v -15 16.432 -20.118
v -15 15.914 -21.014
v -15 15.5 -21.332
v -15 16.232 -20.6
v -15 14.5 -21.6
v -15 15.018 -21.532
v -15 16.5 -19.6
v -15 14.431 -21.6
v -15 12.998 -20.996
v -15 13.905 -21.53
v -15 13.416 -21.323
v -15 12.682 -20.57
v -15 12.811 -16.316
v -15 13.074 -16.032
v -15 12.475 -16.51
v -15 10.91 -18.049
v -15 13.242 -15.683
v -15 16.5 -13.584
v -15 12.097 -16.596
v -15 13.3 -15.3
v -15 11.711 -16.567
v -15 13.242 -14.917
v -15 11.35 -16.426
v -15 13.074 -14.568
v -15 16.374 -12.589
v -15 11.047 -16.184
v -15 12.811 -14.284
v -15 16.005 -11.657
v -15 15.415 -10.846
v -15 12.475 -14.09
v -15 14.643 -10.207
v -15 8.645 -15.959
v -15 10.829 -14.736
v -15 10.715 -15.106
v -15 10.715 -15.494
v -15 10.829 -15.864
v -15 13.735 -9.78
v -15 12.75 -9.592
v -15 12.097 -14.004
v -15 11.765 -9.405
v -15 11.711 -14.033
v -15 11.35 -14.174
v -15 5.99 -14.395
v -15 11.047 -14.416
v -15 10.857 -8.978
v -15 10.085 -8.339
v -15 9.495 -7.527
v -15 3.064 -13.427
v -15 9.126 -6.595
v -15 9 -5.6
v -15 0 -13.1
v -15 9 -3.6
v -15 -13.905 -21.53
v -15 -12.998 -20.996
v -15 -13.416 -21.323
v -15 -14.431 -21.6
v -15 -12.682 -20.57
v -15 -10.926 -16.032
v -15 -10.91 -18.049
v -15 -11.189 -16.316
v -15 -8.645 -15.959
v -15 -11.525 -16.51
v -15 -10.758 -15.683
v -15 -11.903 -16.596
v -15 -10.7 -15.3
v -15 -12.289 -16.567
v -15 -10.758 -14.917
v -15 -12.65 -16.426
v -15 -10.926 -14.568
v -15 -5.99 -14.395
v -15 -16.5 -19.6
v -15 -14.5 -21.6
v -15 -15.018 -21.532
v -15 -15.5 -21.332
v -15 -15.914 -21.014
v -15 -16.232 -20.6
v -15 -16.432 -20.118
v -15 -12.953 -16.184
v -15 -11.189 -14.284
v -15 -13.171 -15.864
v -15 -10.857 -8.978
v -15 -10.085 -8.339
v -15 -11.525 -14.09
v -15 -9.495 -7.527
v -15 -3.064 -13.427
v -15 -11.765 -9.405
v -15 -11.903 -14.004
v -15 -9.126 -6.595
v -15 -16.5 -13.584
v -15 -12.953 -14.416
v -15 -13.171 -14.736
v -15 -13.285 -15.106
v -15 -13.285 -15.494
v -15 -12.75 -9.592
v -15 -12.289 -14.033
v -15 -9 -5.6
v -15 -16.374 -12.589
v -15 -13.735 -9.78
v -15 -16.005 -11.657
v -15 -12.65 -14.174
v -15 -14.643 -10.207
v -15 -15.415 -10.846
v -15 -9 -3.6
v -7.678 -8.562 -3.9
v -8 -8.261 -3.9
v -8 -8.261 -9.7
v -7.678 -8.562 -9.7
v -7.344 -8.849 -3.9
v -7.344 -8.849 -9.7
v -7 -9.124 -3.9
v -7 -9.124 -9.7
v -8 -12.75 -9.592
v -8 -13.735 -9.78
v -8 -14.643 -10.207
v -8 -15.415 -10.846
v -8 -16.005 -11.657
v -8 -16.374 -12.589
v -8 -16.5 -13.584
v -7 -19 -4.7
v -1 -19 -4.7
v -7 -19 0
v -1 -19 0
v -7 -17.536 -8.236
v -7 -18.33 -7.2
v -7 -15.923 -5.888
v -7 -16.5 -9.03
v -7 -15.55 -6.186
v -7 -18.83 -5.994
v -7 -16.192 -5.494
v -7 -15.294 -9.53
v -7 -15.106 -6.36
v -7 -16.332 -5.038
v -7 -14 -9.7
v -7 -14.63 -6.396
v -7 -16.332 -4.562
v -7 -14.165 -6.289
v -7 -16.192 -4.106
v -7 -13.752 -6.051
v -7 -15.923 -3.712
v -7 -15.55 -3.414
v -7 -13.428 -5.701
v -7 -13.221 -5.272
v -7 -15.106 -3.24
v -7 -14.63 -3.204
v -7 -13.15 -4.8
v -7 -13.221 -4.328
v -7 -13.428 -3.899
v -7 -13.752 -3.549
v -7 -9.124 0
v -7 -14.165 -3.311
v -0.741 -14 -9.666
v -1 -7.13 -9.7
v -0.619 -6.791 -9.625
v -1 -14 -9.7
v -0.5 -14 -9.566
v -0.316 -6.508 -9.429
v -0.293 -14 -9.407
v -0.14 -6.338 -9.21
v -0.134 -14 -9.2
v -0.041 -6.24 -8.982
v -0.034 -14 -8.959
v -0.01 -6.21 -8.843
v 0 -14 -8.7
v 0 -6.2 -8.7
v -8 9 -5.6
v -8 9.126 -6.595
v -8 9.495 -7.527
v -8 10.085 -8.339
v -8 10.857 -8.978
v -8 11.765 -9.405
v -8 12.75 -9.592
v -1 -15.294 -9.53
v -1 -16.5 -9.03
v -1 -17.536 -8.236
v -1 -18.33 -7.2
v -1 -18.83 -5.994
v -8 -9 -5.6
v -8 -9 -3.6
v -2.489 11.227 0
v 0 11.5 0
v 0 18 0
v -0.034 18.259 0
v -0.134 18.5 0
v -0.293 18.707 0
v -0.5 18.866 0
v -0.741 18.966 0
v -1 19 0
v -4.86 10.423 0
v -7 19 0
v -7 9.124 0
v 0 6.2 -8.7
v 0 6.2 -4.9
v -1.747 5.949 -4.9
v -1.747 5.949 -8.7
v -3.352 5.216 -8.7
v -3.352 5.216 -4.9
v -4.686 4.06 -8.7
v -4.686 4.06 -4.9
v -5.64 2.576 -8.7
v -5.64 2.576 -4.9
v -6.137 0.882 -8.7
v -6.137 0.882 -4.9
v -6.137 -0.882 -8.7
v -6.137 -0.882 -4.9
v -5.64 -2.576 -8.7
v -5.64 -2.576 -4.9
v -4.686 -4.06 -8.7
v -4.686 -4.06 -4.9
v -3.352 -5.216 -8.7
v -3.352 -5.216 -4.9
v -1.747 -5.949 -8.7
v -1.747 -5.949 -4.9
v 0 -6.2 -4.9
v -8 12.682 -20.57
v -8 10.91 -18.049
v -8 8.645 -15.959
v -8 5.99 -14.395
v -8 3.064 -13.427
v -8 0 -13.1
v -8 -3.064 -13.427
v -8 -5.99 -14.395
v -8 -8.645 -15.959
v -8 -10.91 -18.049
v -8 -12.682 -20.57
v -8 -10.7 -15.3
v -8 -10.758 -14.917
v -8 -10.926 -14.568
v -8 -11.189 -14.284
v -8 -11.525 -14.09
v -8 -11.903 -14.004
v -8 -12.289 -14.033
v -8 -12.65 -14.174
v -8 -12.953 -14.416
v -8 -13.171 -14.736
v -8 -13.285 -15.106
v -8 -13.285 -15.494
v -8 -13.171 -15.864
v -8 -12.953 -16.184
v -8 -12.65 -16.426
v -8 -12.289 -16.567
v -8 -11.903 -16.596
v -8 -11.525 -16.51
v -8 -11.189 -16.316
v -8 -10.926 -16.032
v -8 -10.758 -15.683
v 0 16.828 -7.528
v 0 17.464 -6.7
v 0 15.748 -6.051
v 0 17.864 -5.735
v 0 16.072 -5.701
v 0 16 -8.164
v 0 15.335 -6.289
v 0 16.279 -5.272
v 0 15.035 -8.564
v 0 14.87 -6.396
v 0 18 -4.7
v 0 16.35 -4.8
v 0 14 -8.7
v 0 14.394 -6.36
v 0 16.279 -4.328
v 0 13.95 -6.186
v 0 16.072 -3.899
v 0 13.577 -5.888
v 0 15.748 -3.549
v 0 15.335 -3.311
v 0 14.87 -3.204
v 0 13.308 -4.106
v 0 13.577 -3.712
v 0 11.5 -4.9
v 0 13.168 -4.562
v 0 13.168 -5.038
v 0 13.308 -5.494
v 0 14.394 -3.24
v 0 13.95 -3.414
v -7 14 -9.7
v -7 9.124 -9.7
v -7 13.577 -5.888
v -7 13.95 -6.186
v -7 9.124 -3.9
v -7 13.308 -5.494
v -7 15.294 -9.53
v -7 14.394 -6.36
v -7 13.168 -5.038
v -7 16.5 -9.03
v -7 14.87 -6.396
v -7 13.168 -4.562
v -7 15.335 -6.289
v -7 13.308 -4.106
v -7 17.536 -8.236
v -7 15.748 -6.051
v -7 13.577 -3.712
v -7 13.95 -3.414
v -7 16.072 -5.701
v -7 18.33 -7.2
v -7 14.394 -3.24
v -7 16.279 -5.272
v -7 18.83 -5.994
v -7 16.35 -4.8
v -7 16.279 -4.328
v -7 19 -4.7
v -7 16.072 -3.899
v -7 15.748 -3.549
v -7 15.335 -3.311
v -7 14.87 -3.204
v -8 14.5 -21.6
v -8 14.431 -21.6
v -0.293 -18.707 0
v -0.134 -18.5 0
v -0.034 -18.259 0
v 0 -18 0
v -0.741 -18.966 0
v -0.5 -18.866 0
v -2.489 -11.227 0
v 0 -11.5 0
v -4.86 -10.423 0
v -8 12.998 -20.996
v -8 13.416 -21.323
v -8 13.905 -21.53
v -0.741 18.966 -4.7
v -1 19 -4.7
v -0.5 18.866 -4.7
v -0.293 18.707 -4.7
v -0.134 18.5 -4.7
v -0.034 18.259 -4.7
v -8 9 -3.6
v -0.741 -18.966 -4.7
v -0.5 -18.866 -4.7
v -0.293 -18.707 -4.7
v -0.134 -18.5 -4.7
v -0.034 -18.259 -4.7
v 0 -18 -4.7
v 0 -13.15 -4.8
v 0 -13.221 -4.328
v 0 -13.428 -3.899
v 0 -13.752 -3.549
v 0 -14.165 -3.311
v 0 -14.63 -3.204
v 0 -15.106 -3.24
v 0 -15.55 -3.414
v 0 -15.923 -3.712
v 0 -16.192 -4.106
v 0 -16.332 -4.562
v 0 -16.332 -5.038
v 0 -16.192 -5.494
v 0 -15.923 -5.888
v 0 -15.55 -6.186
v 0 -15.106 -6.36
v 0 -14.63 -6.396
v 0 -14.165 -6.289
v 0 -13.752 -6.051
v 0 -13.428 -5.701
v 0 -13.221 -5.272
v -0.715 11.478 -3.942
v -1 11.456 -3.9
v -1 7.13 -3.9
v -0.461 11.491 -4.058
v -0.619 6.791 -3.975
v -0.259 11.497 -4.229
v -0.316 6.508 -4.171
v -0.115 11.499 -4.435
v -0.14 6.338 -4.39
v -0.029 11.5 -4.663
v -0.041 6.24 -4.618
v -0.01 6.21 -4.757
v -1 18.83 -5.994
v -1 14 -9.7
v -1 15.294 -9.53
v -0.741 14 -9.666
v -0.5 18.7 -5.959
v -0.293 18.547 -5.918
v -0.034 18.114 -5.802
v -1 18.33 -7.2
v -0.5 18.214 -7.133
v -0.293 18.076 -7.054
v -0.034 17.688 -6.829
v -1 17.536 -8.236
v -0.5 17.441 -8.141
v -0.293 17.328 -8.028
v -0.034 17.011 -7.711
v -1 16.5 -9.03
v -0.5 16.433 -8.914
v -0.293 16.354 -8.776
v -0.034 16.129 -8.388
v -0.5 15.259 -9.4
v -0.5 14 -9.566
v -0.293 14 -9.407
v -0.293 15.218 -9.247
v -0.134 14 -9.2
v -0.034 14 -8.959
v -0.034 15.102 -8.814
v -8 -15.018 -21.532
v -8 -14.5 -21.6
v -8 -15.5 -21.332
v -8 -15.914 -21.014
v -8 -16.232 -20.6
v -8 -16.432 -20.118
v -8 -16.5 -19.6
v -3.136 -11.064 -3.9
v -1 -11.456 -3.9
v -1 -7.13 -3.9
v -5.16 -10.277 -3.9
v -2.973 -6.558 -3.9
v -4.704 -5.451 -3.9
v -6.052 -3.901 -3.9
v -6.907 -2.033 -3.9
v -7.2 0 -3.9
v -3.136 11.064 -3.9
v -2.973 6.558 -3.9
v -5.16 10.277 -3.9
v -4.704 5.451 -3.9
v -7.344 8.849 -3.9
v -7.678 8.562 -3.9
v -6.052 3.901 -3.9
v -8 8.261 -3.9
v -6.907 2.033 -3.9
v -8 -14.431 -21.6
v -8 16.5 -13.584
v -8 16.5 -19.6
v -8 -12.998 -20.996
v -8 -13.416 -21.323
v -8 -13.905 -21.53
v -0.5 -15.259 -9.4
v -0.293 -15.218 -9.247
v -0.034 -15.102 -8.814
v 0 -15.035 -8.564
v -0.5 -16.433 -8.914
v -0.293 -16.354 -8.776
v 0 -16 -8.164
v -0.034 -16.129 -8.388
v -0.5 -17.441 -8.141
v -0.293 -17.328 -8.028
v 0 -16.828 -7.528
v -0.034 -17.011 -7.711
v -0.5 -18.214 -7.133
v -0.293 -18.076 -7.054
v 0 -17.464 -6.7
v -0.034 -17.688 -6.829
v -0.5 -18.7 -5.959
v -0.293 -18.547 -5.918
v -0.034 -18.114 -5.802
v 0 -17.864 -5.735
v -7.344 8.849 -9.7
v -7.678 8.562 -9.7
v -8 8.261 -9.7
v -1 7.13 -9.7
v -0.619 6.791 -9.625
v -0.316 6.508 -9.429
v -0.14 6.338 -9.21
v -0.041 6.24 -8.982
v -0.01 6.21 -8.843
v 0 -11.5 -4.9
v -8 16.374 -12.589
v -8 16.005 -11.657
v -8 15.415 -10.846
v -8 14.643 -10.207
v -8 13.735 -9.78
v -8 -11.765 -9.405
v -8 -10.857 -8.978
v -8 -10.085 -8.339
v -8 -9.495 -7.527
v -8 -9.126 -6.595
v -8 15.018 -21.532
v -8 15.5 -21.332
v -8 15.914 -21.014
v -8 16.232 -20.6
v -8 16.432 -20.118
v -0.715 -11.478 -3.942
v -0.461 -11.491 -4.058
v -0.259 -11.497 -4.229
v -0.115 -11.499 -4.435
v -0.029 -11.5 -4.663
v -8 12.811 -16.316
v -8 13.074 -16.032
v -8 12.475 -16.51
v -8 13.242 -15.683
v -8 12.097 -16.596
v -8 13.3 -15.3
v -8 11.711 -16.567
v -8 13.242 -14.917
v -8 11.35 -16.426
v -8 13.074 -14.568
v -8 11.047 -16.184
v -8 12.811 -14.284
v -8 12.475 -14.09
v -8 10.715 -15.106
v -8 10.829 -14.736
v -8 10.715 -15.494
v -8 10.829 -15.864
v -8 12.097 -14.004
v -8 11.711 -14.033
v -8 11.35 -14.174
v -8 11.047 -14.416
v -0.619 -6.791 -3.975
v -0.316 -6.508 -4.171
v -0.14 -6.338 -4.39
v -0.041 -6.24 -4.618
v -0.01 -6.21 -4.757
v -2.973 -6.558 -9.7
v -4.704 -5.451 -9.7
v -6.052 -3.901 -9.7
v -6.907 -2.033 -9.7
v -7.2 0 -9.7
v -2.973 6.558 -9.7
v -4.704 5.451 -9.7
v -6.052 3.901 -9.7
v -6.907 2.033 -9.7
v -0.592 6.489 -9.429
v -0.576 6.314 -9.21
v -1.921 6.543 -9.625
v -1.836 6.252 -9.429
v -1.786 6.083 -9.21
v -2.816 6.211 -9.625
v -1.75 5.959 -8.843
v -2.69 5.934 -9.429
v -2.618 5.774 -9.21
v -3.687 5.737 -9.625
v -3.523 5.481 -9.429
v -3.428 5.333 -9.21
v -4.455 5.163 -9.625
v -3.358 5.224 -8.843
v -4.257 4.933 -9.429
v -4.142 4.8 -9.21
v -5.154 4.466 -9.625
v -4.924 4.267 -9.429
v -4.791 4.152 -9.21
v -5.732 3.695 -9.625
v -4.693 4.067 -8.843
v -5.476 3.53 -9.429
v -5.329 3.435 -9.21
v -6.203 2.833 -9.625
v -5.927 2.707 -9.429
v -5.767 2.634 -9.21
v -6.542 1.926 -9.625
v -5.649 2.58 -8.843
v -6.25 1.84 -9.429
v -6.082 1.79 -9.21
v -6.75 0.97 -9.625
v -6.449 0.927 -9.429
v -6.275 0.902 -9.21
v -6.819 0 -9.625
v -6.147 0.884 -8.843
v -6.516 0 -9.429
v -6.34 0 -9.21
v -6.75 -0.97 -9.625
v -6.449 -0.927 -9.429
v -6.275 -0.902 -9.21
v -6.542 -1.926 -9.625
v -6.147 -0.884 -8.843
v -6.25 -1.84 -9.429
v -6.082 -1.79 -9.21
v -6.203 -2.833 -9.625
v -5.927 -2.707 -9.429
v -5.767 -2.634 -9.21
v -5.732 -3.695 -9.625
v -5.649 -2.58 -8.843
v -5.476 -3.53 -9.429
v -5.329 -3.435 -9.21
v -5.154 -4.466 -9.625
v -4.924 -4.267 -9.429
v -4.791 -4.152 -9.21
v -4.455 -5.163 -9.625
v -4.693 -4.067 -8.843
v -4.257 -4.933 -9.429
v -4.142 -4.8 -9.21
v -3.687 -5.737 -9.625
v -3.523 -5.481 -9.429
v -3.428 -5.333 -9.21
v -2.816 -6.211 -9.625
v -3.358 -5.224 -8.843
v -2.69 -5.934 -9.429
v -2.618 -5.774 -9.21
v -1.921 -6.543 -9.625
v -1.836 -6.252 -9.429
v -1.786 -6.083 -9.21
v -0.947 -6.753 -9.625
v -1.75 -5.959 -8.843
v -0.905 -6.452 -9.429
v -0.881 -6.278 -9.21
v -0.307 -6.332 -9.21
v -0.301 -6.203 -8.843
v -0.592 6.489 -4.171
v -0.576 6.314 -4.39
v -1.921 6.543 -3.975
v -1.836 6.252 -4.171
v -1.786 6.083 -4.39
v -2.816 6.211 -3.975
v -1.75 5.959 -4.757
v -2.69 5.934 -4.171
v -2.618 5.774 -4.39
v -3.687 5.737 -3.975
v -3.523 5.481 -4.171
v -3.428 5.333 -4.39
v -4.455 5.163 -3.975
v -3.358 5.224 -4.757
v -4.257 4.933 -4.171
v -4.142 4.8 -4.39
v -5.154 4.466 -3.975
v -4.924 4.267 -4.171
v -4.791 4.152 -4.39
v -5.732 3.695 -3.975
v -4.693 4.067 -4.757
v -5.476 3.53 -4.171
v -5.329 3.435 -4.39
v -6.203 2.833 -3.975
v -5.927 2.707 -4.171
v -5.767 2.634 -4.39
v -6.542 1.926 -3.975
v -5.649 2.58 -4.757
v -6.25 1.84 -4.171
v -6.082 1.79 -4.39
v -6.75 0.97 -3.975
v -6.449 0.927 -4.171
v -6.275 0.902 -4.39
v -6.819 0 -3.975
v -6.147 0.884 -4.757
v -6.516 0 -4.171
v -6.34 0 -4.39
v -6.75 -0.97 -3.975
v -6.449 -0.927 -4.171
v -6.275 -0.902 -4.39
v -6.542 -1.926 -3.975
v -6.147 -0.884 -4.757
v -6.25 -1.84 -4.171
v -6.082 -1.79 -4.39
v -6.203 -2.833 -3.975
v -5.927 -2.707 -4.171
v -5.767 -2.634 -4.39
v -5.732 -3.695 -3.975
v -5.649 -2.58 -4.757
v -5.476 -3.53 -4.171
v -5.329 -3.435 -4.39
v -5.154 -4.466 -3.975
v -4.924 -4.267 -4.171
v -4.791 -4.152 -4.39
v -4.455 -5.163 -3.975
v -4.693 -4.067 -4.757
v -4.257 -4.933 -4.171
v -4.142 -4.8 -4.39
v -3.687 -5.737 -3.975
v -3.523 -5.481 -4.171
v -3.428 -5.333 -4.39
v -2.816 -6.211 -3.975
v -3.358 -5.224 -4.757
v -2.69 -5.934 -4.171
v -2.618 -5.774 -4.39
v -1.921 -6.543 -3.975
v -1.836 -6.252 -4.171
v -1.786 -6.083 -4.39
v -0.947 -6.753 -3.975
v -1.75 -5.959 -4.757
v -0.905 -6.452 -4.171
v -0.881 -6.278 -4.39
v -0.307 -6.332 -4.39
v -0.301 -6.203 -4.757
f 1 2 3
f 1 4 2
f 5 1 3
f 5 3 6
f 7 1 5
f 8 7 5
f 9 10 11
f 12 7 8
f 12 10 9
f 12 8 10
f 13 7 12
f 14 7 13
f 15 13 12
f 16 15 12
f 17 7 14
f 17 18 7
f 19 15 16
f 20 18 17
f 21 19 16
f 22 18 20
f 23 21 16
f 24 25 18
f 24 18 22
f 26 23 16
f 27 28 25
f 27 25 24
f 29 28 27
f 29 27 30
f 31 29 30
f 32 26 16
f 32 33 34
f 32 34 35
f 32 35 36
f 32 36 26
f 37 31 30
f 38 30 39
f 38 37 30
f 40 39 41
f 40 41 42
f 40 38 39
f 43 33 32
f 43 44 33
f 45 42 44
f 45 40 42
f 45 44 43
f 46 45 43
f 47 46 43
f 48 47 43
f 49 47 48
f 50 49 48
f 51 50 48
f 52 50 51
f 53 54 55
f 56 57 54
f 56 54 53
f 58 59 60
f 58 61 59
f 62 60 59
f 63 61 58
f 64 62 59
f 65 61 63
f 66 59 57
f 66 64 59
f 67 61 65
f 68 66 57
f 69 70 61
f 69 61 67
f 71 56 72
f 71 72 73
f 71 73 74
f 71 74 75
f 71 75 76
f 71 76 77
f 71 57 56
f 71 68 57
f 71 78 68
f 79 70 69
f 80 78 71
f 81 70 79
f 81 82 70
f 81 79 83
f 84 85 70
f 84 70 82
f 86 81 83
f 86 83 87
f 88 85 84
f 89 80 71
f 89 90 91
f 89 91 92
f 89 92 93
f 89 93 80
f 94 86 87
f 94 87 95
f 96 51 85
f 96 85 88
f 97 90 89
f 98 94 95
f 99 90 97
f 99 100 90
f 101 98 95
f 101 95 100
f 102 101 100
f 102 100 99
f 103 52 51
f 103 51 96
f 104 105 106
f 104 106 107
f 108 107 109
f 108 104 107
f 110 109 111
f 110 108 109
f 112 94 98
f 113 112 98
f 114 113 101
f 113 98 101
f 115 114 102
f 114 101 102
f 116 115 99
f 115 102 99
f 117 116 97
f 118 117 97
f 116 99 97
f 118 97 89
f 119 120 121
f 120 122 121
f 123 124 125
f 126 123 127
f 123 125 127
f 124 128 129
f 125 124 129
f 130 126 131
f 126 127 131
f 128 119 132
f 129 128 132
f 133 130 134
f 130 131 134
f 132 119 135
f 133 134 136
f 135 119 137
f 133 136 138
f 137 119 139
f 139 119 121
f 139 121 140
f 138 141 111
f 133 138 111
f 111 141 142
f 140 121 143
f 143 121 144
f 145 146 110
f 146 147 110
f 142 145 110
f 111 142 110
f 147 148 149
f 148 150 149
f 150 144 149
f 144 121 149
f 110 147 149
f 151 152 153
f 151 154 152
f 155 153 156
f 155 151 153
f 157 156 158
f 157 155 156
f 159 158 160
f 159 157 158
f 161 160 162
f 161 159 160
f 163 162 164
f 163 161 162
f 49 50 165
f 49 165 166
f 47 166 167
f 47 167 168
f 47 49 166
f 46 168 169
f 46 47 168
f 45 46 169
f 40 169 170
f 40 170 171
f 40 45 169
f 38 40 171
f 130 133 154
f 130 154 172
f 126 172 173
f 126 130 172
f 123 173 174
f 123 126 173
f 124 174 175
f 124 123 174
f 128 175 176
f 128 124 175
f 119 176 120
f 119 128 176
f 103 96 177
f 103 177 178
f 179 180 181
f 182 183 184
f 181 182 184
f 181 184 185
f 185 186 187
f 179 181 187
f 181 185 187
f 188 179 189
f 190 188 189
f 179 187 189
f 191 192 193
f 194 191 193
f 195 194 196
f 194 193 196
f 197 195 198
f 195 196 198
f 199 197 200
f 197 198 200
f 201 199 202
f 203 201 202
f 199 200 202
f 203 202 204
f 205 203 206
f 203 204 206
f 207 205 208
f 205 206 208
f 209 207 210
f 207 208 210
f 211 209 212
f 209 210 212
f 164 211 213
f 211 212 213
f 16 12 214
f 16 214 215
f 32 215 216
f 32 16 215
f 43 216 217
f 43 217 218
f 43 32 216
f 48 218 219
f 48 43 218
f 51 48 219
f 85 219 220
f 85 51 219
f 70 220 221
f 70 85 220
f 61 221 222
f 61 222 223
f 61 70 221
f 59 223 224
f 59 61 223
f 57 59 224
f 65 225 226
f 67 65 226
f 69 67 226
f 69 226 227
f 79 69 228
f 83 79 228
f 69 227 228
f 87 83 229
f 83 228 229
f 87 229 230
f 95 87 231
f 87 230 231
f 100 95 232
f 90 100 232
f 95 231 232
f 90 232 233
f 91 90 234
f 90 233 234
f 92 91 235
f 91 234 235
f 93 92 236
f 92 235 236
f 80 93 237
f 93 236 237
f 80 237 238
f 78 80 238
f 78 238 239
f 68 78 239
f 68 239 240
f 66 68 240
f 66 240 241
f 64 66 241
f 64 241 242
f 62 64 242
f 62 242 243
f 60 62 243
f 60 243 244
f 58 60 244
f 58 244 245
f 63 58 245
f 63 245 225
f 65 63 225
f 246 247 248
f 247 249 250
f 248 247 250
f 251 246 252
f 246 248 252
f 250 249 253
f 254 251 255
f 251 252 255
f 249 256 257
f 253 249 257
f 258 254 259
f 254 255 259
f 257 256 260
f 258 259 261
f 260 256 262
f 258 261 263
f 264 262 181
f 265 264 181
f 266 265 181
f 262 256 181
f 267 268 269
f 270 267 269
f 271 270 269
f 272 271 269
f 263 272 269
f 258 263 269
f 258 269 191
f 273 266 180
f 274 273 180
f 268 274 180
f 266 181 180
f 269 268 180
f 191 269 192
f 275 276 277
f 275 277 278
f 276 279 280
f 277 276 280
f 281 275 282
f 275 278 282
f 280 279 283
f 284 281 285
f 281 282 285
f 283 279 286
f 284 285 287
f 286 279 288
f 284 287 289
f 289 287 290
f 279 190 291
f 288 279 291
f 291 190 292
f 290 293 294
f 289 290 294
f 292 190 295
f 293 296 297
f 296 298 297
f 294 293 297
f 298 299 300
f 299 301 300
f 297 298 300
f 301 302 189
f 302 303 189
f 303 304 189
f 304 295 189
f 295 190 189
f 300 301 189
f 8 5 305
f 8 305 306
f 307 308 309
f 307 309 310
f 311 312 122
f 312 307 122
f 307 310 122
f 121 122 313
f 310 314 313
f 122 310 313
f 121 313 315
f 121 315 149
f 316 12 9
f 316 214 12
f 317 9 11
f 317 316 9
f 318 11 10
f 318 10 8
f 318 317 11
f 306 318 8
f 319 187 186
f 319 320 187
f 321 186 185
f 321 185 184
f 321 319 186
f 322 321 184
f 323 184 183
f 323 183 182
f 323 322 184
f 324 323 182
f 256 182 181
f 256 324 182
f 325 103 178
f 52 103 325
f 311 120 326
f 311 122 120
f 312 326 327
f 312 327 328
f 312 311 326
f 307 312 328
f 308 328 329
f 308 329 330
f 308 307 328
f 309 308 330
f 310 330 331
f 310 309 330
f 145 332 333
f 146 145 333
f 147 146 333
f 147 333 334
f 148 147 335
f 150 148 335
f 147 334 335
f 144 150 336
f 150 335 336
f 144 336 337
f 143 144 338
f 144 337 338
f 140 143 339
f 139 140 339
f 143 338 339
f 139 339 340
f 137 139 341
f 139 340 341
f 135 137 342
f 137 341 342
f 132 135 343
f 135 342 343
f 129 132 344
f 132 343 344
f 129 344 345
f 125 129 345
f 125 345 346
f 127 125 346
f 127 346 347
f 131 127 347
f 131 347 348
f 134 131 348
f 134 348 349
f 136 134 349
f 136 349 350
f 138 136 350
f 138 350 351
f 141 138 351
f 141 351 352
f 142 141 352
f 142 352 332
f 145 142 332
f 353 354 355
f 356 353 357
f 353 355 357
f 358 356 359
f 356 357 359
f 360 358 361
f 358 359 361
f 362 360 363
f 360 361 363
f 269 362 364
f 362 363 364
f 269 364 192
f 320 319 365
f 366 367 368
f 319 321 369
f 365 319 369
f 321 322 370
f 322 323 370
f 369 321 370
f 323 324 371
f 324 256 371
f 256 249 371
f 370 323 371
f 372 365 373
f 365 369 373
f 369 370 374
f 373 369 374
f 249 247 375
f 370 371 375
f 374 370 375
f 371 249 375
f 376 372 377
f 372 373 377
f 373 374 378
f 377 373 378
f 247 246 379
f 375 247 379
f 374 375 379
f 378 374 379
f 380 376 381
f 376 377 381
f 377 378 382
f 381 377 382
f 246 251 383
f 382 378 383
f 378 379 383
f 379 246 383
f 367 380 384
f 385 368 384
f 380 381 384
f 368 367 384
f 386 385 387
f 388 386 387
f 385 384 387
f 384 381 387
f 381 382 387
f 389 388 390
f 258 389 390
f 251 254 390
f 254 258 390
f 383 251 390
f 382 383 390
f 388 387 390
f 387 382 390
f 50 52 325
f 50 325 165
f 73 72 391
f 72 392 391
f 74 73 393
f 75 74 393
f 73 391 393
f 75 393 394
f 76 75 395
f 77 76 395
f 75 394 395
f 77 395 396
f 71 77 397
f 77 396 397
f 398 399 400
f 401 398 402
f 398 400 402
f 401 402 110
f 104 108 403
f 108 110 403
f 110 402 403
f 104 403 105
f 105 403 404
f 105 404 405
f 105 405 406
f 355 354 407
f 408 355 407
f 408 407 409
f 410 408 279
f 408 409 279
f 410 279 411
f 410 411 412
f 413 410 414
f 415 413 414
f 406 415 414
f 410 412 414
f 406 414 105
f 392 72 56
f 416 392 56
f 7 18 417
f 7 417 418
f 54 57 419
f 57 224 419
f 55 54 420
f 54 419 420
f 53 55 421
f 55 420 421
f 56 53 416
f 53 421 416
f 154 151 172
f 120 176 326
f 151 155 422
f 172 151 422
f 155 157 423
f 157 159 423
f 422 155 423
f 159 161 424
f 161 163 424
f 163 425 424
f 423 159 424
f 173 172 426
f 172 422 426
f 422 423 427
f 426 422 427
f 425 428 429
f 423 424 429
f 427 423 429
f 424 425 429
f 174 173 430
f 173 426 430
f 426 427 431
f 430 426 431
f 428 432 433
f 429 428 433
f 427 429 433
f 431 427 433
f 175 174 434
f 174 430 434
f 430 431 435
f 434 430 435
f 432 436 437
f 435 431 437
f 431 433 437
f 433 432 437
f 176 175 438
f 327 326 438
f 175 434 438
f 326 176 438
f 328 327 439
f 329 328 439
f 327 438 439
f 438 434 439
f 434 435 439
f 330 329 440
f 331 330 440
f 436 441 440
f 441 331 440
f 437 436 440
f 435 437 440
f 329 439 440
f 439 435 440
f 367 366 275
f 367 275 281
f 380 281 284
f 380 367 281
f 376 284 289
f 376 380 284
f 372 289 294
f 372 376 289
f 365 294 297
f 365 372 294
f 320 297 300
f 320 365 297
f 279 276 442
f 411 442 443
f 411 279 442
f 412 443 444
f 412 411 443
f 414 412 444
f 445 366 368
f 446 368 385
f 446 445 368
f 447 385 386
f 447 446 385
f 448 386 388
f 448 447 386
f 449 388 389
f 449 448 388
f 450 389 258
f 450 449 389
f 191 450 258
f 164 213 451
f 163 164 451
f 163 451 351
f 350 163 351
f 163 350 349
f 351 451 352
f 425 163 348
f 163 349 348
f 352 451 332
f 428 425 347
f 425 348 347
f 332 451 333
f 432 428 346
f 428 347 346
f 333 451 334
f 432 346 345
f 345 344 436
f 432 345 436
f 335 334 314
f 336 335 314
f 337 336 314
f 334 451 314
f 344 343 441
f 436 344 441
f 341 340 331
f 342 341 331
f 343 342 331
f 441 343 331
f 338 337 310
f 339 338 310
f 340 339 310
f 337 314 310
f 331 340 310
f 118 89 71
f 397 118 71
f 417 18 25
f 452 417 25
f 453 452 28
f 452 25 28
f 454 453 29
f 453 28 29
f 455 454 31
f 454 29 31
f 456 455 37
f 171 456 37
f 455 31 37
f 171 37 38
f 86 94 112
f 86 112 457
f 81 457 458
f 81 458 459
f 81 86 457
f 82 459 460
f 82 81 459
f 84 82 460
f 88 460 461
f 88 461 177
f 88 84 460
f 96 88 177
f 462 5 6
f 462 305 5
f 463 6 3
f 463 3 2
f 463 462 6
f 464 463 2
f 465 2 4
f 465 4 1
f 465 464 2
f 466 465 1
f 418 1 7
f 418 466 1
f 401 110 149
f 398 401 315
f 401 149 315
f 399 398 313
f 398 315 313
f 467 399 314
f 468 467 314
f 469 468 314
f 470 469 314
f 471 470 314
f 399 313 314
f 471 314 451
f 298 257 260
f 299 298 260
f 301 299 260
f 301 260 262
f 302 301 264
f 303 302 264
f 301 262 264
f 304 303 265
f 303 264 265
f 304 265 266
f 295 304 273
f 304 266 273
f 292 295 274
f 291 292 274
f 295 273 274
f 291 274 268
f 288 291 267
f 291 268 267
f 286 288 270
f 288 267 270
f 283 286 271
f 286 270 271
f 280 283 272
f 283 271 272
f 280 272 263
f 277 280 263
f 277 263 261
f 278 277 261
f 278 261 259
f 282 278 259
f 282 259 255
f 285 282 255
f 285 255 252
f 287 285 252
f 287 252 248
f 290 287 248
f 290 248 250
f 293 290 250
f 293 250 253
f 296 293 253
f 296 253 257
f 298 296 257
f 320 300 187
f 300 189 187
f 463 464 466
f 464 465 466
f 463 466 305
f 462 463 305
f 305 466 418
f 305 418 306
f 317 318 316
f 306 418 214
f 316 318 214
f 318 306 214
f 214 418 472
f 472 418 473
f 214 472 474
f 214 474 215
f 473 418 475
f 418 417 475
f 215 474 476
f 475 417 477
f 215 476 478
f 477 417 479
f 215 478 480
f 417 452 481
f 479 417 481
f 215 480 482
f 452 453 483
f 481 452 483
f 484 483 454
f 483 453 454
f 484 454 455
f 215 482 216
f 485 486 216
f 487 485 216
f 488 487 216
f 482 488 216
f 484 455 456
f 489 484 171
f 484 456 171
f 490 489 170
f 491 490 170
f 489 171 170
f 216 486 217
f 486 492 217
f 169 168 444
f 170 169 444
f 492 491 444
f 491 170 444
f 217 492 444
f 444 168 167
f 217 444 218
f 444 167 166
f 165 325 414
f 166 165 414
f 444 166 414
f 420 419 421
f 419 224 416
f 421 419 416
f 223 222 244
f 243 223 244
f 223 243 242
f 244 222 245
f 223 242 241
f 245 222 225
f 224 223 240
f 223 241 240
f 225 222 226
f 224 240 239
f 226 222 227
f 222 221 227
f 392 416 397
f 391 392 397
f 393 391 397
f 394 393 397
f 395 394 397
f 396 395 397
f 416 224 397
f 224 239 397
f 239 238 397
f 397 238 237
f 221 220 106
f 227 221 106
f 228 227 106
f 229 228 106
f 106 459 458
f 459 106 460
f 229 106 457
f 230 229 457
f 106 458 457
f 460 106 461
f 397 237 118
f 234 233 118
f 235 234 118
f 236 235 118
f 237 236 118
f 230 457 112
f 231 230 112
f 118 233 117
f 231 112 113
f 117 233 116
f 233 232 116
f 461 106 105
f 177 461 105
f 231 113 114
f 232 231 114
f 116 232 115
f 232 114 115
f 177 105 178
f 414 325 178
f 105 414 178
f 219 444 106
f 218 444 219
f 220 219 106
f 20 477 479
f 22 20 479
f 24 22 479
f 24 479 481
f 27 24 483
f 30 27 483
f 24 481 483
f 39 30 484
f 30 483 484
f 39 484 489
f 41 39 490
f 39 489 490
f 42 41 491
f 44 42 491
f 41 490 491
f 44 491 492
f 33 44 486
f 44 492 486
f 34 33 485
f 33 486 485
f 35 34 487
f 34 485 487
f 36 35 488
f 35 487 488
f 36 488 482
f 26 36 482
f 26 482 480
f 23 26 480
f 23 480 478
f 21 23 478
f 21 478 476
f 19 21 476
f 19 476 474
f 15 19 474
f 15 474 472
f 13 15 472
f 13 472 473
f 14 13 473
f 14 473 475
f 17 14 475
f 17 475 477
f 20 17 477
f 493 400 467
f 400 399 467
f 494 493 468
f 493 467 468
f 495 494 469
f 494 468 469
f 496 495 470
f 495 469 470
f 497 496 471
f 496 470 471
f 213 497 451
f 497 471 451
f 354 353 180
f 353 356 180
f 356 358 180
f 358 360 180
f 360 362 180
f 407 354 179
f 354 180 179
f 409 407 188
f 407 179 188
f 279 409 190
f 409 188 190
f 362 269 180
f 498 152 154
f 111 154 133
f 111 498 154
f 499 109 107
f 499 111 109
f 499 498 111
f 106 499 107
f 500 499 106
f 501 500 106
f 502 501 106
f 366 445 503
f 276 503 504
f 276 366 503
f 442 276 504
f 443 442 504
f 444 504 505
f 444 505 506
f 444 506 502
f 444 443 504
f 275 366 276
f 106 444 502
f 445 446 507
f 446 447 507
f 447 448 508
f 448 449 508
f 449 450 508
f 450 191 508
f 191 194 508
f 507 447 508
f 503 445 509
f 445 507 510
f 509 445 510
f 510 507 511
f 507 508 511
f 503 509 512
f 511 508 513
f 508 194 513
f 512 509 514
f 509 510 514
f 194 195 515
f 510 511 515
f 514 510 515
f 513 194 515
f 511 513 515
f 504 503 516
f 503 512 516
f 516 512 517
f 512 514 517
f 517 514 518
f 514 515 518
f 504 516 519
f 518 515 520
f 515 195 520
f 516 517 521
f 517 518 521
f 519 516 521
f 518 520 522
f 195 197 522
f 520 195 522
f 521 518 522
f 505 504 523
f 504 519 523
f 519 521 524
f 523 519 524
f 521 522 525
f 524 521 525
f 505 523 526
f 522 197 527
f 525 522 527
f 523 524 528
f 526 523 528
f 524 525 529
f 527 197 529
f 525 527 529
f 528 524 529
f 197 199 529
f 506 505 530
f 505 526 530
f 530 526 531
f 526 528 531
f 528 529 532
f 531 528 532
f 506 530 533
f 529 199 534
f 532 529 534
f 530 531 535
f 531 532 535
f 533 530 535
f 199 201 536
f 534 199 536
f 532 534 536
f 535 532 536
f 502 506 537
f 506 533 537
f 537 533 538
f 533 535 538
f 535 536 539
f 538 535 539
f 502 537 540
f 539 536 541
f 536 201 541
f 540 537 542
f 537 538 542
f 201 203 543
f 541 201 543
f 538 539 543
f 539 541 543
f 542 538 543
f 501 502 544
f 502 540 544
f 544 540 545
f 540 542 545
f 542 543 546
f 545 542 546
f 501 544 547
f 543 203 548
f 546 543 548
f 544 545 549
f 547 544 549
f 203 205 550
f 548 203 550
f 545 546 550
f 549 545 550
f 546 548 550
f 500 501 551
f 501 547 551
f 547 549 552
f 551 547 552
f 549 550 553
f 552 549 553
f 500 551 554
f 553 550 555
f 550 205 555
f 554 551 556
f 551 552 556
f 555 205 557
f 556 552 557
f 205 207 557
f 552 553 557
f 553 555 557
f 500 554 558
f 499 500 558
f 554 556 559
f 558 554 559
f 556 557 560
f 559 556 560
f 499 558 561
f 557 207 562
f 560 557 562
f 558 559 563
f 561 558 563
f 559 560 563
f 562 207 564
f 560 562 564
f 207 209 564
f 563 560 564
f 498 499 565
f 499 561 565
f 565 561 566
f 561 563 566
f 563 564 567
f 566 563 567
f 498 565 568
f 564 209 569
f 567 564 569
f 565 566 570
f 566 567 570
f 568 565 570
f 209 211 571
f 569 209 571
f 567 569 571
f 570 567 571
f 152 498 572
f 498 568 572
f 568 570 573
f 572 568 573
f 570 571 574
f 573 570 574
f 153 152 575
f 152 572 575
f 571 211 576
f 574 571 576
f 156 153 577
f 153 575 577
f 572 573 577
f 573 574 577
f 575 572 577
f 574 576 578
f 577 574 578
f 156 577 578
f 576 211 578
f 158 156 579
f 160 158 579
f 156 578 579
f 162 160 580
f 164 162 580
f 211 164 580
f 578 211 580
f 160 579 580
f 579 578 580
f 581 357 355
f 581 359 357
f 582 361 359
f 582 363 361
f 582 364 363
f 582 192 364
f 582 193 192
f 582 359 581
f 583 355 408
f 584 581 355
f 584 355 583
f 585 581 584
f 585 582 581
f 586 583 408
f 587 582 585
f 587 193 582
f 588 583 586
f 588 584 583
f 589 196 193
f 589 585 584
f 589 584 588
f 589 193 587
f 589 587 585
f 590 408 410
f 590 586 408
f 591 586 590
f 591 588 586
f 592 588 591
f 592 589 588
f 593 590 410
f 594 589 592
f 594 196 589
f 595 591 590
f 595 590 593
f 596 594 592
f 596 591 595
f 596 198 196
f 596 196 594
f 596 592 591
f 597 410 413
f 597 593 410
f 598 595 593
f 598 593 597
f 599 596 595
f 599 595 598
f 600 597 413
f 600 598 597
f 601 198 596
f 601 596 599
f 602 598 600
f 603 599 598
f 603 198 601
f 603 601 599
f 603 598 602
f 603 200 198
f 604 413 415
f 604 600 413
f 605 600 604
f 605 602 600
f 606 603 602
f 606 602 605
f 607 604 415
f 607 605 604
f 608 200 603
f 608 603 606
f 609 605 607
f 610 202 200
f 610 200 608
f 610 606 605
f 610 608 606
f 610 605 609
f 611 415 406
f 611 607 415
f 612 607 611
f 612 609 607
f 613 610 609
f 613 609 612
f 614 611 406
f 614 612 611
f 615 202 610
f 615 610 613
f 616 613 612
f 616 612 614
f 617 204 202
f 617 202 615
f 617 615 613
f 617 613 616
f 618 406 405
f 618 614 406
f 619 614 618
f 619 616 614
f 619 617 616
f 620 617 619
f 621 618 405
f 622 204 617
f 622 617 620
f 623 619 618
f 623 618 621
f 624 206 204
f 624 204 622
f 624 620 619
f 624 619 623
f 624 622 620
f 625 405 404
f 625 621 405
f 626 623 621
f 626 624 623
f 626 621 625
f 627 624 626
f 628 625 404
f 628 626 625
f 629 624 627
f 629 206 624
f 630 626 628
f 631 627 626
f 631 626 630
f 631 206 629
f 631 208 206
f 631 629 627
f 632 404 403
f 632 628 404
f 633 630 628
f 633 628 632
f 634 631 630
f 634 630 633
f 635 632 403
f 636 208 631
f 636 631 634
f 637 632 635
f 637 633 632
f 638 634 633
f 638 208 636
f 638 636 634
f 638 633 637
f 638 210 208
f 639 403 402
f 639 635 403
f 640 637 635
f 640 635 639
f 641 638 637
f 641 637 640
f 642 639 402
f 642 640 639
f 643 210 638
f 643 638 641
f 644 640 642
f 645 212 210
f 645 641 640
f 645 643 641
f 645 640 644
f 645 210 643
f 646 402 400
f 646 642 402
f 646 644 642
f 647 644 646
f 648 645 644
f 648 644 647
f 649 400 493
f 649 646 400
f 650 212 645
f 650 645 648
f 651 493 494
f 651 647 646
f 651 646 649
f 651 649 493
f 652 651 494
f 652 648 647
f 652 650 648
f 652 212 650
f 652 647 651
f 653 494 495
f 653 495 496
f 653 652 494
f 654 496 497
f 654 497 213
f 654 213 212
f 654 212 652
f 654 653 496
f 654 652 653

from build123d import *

# Parameters (mm, degrees)
PAD008_DEPTH    = 9.7
POCKET002_DEPTH = 3.9
PAD009_DEPTH    = 7
SKETCH048_R     = 1.6
SKETCH048_R_2   = 1.3
POCKET030_DEPTH = 15.001
FILLET006_R     = 5
FILLET007_R     = 2
FILLET008_R     = 1


with BuildPart() as part:
    # Sketch045 → Pad008 (new body)
    with BuildSketch(Plane.XY):
        with BuildLine():
            Line((-7, 19), (0, 19))
            Line((0, 19), (0, 6.2))
            ThreePointArc((0, 6.2), (-6.2, 0), (0, -6.2))
            Line((0, -6.2), (0, -19))
            Line((0, -19), (-7, -19))
            Line((-7, -19), (-7, -9.1241437954))
            ThreePointArc((-7, 9.1241437954), (-11.5, 0), (-7, -9.1241437954))
            Line((-7, 9.1241437954), (-7, 19))
        make_face()
    extrude(amount=-PAD008_DEPTH)

    # Sketch046 → Pocket002 (cut)
    with BuildSketch(Plane.XY):
        with BuildLine():
            Line((0, 11.5), (0, 6.2))
            ThreePointArc((0, 6.2), (-6.2, 0), (0, -6.2))
            Line((0, -6.2), (0, -11.5))
            ThreePointArc((0, 11.5), (-11.5, 0), (0, -11.5))
        make_face()
    extrude(amount=-POCKET002_DEPTH, mode=Mode.SUBTRACT)

    # Sketch047 → Pad009 (join)
    with BuildSketch(Plane.YZ.offset(-15)):
        with BuildLine():
            ThreePointArc((13.2003787824, -21.6), (0, -13.1), (-13.2003787824, -21.6))
            Line((-16.5, -21.6), (-13.2003787824, -21.6))
            Line((-16.5, -13.5843597113), (-16.5, -21.6))
            ThreePointArc((-12.75, -9.5921798557), (-15.4154759474, -10.8457469238), (-16.5, -13.5843597113))
            ThreePointArc((-12.75, -9.5921798557), (-10.0845240526, -8.3386127875), (-9, -5.6))
            Line((-9, -5.6), (-9, -3.6))
            Line((-9, -3.6), (9, -3.6))
            Line((9, -3.6), (9, -5.6))
            ThreePointArc((9, -5.6), (10.0845240526, -8.3386127875), (12.75, -9.5921798557))
            ThreePointArc((16.5, -13.5843597113), (15.4154759474, -10.8457469238), (12.75, -9.5921798557))
            Line((16.5, -13.5843597113), (16.5, -21.6))
            Line((16.5, -21.6), (13.2003787824, -21.6))
        make_face()
    extrude(amount=PAD009_DEPTH)

    # Sketch048 → Pocket030 (cut, through all)
    with BuildSketch(Plane.YZ):
        with Locations((-14.75, -4.8)):
            Circle(SKETCH048_R)
        with Locations((14.75, -4.8)):
            Circle(SKETCH048_R)
        with Locations((-12, -15.3)):
            Circle(SKETCH048_R_2)
        with Locations((12, -15.3)):
            Circle(SKETCH048_R_2)
    extrude(amount=-POCKET030_DEPTH, mode=Mode.SUBTRACT)

    # Fillet006
    fillet006_edges = [part.edges().sort_by_distance(p)[0] for p in [
        (-3.5, 19, -9.7),
        (-3.5, -19, -9.7),
    ]]
    fillet(fillet006_edges, radius=FILLET006_R)

    # Fillet007
    fillet007_edges = [part.edges().sort_by_distance(p)[0] for p in [
        (-11.5, -13.200379, -21.6),
        (-11.5, -16.5, -21.6),
        (-11.5, 13.200379, -21.6),
        (-11.5, 16.5, -21.6),
    ]]
    fillet(fillet007_edges, radius=FILLET007_R)

    # Fillet008
    fillet008_edges = [part.edges().sort_by_distance(p)[0] for p in [
        (-6.2, 0, -3.9),
        (-6.2, 0, -9.7),
        (0, -8.85, -3.9),
        (0, -10.1, -9.7),
        (0, 8.85, -3.9),
        (0, 10.1, -9.7),
    ]]
    fillet(fillet008_edges, radius=FILLET008_R)


solid = part.part
